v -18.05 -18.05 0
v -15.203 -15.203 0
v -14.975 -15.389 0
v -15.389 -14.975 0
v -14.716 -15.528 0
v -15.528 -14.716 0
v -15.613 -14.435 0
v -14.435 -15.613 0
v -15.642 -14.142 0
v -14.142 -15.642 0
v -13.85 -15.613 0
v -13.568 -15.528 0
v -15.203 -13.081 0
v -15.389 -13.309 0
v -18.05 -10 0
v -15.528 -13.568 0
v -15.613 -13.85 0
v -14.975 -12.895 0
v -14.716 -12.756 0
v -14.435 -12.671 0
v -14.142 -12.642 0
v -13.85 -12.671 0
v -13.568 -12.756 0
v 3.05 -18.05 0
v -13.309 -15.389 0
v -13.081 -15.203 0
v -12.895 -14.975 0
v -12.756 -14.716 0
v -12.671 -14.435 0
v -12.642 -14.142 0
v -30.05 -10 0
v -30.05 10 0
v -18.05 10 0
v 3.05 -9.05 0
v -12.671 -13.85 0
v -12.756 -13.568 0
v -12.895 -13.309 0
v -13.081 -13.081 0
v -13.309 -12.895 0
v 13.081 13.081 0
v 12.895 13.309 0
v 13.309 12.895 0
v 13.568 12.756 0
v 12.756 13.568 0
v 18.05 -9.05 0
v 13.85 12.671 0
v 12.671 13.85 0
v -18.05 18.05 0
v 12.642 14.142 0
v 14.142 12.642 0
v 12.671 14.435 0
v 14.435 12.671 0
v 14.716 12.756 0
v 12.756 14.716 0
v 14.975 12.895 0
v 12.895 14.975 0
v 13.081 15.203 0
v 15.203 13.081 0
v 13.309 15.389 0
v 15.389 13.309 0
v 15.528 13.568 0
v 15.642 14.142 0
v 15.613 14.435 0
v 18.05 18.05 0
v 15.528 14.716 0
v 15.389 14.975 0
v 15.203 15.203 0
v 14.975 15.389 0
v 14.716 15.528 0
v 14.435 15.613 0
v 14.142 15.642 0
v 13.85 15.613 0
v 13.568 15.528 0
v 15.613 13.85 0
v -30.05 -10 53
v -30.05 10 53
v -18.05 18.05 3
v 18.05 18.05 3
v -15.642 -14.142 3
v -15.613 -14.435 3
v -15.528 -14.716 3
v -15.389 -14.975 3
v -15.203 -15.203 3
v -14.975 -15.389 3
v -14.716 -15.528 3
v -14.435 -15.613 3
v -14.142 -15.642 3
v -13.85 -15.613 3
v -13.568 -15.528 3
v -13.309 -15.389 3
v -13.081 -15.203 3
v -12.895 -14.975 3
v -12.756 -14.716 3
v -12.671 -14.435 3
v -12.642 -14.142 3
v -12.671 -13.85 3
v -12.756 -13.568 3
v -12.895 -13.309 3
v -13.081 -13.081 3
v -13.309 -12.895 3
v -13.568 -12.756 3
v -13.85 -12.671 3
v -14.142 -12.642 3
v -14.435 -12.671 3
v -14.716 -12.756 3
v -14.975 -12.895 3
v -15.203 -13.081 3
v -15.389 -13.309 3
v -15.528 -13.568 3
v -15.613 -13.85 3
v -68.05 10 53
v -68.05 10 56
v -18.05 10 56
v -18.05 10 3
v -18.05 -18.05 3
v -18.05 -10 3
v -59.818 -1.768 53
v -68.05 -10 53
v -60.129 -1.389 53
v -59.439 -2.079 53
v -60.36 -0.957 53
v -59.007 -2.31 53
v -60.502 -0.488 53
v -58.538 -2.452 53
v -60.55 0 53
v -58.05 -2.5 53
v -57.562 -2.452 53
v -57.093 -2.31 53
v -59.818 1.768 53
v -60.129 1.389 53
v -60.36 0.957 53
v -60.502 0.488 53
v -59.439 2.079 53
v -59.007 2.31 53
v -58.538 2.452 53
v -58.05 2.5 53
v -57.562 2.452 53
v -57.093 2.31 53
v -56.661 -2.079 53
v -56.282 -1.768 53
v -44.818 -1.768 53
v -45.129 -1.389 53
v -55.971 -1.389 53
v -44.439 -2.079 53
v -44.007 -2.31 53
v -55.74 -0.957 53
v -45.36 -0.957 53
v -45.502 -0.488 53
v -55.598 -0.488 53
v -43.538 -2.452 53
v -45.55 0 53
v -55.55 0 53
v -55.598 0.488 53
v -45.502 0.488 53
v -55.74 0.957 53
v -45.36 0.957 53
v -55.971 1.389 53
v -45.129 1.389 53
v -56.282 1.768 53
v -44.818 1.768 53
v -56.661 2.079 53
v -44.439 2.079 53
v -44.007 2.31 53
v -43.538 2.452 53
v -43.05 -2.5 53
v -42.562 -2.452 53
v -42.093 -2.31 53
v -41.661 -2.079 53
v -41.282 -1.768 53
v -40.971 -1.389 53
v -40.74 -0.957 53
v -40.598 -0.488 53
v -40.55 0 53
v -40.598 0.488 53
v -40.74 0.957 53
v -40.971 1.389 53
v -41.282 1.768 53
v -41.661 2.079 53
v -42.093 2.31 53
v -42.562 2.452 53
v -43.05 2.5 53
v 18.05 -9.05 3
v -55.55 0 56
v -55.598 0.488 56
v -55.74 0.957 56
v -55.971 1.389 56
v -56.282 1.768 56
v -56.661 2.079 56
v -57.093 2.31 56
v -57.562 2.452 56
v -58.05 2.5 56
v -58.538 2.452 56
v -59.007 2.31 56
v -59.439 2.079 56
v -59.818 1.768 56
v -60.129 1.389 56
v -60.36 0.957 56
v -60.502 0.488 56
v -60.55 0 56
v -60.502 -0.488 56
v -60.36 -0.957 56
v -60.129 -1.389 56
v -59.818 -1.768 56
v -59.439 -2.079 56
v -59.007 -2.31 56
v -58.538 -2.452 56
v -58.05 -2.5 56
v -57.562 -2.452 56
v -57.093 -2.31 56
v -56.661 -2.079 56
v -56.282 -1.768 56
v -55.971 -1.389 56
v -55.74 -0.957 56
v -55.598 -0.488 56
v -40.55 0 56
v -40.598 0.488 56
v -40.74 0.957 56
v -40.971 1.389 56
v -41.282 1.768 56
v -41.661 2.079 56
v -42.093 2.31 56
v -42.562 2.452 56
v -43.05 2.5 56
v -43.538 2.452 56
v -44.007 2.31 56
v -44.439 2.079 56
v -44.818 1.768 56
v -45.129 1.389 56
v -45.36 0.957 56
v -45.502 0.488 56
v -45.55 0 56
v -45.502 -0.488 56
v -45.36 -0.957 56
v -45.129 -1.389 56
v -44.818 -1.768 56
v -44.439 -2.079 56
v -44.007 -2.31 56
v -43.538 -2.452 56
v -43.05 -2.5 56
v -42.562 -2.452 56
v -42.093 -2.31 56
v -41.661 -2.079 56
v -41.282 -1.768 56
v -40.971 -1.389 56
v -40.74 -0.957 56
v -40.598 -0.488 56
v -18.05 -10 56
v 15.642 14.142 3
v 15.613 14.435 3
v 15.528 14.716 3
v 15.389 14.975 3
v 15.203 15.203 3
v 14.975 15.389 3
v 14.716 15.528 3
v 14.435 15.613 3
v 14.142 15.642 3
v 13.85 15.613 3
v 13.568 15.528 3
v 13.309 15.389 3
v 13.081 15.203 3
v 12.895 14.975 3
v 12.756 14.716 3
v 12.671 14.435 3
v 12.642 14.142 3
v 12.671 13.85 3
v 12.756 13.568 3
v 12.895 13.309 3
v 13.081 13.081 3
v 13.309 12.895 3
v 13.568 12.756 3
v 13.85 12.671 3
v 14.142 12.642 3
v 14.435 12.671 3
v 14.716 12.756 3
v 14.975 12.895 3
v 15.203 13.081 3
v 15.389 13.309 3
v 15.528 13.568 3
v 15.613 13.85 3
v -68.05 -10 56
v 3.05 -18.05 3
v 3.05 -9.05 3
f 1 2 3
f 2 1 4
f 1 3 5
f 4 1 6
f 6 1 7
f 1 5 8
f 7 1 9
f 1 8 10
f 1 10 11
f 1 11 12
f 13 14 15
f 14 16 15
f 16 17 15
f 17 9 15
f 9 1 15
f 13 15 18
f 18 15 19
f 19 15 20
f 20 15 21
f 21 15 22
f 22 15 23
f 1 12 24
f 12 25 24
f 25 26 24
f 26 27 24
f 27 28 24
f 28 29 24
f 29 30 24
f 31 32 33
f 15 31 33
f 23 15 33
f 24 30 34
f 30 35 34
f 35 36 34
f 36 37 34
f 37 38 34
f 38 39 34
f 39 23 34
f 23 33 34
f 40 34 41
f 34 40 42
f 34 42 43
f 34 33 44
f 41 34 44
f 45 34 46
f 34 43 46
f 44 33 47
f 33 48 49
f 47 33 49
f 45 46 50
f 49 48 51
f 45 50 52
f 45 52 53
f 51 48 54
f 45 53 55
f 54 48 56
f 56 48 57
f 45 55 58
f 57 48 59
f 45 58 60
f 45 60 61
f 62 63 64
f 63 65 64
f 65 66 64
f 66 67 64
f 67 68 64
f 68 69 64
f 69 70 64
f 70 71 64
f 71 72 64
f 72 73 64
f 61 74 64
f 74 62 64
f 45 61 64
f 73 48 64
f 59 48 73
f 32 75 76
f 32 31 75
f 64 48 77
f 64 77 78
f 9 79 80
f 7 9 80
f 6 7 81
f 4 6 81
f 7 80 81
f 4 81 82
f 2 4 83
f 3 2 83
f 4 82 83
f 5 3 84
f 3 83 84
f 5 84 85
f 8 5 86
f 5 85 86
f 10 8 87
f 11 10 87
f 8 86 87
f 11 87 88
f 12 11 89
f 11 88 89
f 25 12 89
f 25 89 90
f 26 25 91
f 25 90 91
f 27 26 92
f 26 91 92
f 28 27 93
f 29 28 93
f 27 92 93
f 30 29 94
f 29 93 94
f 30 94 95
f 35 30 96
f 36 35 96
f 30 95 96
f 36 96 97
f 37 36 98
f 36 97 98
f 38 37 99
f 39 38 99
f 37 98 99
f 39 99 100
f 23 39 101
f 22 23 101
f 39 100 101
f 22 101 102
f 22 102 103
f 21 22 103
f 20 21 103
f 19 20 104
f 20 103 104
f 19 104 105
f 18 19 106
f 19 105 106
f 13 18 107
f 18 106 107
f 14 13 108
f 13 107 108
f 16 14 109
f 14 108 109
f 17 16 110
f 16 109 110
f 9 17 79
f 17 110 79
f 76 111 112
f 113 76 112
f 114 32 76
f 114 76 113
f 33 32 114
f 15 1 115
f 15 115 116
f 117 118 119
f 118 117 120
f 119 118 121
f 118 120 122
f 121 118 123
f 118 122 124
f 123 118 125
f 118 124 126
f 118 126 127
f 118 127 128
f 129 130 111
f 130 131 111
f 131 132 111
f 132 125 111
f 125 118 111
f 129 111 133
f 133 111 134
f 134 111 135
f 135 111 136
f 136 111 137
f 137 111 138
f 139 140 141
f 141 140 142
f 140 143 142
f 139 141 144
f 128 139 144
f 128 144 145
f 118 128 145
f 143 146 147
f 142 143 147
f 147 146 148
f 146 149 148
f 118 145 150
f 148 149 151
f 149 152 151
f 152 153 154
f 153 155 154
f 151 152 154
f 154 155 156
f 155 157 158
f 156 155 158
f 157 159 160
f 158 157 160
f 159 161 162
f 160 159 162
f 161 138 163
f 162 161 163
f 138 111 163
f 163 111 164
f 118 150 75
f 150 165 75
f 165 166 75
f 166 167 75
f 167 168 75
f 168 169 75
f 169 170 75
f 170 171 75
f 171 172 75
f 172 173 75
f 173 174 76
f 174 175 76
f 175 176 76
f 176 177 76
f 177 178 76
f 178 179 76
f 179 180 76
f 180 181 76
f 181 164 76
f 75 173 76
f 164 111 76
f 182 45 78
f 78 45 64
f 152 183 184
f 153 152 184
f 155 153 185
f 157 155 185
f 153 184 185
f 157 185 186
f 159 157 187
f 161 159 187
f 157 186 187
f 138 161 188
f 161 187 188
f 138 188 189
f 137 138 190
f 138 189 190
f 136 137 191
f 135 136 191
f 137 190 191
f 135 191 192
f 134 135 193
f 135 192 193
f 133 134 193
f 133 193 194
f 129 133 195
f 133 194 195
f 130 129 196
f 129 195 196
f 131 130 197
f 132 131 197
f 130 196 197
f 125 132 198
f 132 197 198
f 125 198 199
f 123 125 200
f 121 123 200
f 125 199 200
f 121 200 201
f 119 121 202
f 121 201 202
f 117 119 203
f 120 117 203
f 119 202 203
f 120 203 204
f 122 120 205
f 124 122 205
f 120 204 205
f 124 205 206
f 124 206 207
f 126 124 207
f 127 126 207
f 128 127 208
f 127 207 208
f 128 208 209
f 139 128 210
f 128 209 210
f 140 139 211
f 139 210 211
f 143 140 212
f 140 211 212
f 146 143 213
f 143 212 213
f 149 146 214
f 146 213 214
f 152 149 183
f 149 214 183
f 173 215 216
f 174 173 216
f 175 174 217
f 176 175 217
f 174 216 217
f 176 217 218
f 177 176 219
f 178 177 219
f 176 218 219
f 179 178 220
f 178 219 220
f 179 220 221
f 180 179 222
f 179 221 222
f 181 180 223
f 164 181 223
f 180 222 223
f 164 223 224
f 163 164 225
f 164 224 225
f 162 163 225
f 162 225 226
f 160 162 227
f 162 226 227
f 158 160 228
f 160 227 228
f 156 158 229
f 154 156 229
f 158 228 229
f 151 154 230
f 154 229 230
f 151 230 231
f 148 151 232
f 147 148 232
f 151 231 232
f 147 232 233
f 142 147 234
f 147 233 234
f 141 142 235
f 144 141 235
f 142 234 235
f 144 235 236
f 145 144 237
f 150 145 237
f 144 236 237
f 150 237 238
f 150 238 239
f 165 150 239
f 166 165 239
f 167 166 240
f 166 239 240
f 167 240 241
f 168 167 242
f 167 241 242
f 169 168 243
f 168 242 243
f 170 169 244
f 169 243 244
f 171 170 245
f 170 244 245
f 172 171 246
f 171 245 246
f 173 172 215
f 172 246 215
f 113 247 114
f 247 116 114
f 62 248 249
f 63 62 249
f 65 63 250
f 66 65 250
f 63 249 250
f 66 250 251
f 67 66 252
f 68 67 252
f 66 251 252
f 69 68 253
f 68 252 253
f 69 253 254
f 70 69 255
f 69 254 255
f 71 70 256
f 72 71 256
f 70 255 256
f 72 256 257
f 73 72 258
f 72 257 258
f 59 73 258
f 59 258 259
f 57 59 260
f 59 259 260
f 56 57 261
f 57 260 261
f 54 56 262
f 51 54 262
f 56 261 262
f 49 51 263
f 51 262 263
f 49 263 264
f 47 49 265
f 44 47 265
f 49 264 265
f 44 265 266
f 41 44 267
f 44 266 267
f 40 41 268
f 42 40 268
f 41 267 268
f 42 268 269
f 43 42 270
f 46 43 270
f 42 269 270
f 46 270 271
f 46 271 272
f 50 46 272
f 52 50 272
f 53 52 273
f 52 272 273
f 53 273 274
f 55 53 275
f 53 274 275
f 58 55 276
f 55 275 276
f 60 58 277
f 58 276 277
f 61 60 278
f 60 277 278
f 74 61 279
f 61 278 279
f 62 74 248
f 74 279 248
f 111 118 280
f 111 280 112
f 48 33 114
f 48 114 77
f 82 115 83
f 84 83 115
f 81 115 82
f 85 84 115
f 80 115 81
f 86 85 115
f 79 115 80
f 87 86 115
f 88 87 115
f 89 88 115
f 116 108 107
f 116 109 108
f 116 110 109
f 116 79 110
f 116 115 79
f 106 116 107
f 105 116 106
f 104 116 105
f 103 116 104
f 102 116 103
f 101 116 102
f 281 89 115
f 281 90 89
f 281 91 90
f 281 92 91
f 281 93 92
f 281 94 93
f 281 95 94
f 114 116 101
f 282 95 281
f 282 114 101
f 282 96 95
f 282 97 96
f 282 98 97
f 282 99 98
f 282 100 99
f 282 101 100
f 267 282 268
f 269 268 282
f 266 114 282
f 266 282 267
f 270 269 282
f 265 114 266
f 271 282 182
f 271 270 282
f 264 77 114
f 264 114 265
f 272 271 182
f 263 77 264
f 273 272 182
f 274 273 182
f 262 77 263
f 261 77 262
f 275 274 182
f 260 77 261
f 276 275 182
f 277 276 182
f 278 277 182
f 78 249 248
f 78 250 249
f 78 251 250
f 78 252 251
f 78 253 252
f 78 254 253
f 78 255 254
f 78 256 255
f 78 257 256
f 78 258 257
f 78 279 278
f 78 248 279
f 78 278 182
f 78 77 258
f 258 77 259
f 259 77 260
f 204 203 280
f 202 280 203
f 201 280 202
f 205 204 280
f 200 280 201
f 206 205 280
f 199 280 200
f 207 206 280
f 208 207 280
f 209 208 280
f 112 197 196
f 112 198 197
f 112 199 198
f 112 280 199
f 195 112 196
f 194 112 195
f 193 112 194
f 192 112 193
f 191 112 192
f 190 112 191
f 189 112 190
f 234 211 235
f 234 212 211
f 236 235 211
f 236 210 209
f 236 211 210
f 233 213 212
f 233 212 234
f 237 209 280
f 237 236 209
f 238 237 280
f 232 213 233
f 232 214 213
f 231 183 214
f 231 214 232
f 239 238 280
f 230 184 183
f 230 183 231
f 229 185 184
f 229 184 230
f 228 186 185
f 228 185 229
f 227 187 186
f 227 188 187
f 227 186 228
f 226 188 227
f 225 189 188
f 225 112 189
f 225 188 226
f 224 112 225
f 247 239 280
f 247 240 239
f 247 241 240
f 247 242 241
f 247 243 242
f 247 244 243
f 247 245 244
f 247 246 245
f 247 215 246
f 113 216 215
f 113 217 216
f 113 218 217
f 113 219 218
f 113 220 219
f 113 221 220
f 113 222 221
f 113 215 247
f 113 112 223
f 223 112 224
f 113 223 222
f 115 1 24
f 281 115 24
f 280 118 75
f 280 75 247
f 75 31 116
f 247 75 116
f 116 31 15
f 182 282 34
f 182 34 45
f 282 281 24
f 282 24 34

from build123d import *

# Parameters (mm, degrees)
SKETCH_1_W          = 36.1
SKETCH_1_H          = 36.1
EXTRUDE_1_DEPTH     = 3
SKETCH_2_R          = 1.5
CUT_EXTRUDE_1_DEPTH = 3
SKETCH_3_W          = 15
SKETCH_3_H          = 9
CUT_EXTRUDE_2_DEPTH = 3
SKETCH_4_W          = 12
SKETCH_4_H          = 10
EXTRUDE_2_DEPTH     = 3
SKETCH_5_W          = 12
SKETCH_5_H          = 20
EXTRUDE_3_DEPTH     = 50
SKETCH_7_W          = 50
SKETCH_7_H          = 20
EXTRUDE_4_DEPTH     = 3
SKETCH_9_R          = 2.5
CUT_EXTRUDE_4_DEPTH = 3


with BuildPart() as part:
    # 草图1 → 凸台-拉伸1 (new body)
    with BuildSketch(Plane.XY):
        Rectangle(SKETCH_1_W, SKETCH_1_H)
    extrude(amount=EXTRUDE_1_DEPTH)

    # 草图2 → 切除-拉伸1 (cut)
    with BuildSketch(Plane.XY.offset(3)):
        with Locations((14.142135624, 14.142135624)):
            Circle(SKETCH_2_R)
        with Locations(Location((-14.142135624, -14.142135624, 0), (0, 0, 180))):
            Circle(SKETCH_2_R)
    extrude(amount=-CUT_EXTRUDE_1_DEPTH, mode=Mode.SUBTRACT)

    # 草图3 → 切除-拉伸2 (cut)
    with BuildSketch(Plane.XY.offset(3)):
        with Locations((10.55, -13.55)):
            Rectangle(SKETCH_3_W, SKETCH_3_H)
    extrude(amount=-CUT_EXTRUDE_2_DEPTH, mode=Mode.SUBTRACT)

    # 草图4 → 凸台-拉伸2 (add)
    with BuildSketch(Plane.XY.offset(3)):
        with Locations((-24.05, 5)):
            Rectangle(SKETCH_4_W, SKETCH_4_H)
        with Locations((-24.05, -5)):
            Rectangle(SKETCH_4_W, SKETCH_4_H)
    extrude(amount=-EXTRUDE_2_DEPTH)

    # 草图5 → 凸台-拉伸3 (add)
    with BuildSketch(Plane.XY.offset(3)):
        with Locations((-24.05, 0)):
            Rectangle(SKETCH_5_W, SKETCH_5_H)
    extrude(amount=EXTRUDE_3_DEPTH)

    # 草图7 → 凸台-拉伸4 (add)
    with BuildSketch(Plane.XY.offset(53)):
        with Locations((-43.05, 0)):
            Rectangle(SKETCH_7_W, SKETCH_7_H)
    extrude(amount=EXTRUDE_4_DEPTH)

    # 草图9 → 切除-拉伸4 (cut)
    with BuildSketch(Plane.XY.offset(56)):
        with Locations((-58.05, 0)):
            Circle(SKETCH_9_R)
        with Locations((-43.05, 0)):
            Circle(SKETCH_9_R)
    extrude(amount=-CUT_EXTRUDE_4_DEPTH, mode=Mode.SUBTRACT)


solid = part.part
